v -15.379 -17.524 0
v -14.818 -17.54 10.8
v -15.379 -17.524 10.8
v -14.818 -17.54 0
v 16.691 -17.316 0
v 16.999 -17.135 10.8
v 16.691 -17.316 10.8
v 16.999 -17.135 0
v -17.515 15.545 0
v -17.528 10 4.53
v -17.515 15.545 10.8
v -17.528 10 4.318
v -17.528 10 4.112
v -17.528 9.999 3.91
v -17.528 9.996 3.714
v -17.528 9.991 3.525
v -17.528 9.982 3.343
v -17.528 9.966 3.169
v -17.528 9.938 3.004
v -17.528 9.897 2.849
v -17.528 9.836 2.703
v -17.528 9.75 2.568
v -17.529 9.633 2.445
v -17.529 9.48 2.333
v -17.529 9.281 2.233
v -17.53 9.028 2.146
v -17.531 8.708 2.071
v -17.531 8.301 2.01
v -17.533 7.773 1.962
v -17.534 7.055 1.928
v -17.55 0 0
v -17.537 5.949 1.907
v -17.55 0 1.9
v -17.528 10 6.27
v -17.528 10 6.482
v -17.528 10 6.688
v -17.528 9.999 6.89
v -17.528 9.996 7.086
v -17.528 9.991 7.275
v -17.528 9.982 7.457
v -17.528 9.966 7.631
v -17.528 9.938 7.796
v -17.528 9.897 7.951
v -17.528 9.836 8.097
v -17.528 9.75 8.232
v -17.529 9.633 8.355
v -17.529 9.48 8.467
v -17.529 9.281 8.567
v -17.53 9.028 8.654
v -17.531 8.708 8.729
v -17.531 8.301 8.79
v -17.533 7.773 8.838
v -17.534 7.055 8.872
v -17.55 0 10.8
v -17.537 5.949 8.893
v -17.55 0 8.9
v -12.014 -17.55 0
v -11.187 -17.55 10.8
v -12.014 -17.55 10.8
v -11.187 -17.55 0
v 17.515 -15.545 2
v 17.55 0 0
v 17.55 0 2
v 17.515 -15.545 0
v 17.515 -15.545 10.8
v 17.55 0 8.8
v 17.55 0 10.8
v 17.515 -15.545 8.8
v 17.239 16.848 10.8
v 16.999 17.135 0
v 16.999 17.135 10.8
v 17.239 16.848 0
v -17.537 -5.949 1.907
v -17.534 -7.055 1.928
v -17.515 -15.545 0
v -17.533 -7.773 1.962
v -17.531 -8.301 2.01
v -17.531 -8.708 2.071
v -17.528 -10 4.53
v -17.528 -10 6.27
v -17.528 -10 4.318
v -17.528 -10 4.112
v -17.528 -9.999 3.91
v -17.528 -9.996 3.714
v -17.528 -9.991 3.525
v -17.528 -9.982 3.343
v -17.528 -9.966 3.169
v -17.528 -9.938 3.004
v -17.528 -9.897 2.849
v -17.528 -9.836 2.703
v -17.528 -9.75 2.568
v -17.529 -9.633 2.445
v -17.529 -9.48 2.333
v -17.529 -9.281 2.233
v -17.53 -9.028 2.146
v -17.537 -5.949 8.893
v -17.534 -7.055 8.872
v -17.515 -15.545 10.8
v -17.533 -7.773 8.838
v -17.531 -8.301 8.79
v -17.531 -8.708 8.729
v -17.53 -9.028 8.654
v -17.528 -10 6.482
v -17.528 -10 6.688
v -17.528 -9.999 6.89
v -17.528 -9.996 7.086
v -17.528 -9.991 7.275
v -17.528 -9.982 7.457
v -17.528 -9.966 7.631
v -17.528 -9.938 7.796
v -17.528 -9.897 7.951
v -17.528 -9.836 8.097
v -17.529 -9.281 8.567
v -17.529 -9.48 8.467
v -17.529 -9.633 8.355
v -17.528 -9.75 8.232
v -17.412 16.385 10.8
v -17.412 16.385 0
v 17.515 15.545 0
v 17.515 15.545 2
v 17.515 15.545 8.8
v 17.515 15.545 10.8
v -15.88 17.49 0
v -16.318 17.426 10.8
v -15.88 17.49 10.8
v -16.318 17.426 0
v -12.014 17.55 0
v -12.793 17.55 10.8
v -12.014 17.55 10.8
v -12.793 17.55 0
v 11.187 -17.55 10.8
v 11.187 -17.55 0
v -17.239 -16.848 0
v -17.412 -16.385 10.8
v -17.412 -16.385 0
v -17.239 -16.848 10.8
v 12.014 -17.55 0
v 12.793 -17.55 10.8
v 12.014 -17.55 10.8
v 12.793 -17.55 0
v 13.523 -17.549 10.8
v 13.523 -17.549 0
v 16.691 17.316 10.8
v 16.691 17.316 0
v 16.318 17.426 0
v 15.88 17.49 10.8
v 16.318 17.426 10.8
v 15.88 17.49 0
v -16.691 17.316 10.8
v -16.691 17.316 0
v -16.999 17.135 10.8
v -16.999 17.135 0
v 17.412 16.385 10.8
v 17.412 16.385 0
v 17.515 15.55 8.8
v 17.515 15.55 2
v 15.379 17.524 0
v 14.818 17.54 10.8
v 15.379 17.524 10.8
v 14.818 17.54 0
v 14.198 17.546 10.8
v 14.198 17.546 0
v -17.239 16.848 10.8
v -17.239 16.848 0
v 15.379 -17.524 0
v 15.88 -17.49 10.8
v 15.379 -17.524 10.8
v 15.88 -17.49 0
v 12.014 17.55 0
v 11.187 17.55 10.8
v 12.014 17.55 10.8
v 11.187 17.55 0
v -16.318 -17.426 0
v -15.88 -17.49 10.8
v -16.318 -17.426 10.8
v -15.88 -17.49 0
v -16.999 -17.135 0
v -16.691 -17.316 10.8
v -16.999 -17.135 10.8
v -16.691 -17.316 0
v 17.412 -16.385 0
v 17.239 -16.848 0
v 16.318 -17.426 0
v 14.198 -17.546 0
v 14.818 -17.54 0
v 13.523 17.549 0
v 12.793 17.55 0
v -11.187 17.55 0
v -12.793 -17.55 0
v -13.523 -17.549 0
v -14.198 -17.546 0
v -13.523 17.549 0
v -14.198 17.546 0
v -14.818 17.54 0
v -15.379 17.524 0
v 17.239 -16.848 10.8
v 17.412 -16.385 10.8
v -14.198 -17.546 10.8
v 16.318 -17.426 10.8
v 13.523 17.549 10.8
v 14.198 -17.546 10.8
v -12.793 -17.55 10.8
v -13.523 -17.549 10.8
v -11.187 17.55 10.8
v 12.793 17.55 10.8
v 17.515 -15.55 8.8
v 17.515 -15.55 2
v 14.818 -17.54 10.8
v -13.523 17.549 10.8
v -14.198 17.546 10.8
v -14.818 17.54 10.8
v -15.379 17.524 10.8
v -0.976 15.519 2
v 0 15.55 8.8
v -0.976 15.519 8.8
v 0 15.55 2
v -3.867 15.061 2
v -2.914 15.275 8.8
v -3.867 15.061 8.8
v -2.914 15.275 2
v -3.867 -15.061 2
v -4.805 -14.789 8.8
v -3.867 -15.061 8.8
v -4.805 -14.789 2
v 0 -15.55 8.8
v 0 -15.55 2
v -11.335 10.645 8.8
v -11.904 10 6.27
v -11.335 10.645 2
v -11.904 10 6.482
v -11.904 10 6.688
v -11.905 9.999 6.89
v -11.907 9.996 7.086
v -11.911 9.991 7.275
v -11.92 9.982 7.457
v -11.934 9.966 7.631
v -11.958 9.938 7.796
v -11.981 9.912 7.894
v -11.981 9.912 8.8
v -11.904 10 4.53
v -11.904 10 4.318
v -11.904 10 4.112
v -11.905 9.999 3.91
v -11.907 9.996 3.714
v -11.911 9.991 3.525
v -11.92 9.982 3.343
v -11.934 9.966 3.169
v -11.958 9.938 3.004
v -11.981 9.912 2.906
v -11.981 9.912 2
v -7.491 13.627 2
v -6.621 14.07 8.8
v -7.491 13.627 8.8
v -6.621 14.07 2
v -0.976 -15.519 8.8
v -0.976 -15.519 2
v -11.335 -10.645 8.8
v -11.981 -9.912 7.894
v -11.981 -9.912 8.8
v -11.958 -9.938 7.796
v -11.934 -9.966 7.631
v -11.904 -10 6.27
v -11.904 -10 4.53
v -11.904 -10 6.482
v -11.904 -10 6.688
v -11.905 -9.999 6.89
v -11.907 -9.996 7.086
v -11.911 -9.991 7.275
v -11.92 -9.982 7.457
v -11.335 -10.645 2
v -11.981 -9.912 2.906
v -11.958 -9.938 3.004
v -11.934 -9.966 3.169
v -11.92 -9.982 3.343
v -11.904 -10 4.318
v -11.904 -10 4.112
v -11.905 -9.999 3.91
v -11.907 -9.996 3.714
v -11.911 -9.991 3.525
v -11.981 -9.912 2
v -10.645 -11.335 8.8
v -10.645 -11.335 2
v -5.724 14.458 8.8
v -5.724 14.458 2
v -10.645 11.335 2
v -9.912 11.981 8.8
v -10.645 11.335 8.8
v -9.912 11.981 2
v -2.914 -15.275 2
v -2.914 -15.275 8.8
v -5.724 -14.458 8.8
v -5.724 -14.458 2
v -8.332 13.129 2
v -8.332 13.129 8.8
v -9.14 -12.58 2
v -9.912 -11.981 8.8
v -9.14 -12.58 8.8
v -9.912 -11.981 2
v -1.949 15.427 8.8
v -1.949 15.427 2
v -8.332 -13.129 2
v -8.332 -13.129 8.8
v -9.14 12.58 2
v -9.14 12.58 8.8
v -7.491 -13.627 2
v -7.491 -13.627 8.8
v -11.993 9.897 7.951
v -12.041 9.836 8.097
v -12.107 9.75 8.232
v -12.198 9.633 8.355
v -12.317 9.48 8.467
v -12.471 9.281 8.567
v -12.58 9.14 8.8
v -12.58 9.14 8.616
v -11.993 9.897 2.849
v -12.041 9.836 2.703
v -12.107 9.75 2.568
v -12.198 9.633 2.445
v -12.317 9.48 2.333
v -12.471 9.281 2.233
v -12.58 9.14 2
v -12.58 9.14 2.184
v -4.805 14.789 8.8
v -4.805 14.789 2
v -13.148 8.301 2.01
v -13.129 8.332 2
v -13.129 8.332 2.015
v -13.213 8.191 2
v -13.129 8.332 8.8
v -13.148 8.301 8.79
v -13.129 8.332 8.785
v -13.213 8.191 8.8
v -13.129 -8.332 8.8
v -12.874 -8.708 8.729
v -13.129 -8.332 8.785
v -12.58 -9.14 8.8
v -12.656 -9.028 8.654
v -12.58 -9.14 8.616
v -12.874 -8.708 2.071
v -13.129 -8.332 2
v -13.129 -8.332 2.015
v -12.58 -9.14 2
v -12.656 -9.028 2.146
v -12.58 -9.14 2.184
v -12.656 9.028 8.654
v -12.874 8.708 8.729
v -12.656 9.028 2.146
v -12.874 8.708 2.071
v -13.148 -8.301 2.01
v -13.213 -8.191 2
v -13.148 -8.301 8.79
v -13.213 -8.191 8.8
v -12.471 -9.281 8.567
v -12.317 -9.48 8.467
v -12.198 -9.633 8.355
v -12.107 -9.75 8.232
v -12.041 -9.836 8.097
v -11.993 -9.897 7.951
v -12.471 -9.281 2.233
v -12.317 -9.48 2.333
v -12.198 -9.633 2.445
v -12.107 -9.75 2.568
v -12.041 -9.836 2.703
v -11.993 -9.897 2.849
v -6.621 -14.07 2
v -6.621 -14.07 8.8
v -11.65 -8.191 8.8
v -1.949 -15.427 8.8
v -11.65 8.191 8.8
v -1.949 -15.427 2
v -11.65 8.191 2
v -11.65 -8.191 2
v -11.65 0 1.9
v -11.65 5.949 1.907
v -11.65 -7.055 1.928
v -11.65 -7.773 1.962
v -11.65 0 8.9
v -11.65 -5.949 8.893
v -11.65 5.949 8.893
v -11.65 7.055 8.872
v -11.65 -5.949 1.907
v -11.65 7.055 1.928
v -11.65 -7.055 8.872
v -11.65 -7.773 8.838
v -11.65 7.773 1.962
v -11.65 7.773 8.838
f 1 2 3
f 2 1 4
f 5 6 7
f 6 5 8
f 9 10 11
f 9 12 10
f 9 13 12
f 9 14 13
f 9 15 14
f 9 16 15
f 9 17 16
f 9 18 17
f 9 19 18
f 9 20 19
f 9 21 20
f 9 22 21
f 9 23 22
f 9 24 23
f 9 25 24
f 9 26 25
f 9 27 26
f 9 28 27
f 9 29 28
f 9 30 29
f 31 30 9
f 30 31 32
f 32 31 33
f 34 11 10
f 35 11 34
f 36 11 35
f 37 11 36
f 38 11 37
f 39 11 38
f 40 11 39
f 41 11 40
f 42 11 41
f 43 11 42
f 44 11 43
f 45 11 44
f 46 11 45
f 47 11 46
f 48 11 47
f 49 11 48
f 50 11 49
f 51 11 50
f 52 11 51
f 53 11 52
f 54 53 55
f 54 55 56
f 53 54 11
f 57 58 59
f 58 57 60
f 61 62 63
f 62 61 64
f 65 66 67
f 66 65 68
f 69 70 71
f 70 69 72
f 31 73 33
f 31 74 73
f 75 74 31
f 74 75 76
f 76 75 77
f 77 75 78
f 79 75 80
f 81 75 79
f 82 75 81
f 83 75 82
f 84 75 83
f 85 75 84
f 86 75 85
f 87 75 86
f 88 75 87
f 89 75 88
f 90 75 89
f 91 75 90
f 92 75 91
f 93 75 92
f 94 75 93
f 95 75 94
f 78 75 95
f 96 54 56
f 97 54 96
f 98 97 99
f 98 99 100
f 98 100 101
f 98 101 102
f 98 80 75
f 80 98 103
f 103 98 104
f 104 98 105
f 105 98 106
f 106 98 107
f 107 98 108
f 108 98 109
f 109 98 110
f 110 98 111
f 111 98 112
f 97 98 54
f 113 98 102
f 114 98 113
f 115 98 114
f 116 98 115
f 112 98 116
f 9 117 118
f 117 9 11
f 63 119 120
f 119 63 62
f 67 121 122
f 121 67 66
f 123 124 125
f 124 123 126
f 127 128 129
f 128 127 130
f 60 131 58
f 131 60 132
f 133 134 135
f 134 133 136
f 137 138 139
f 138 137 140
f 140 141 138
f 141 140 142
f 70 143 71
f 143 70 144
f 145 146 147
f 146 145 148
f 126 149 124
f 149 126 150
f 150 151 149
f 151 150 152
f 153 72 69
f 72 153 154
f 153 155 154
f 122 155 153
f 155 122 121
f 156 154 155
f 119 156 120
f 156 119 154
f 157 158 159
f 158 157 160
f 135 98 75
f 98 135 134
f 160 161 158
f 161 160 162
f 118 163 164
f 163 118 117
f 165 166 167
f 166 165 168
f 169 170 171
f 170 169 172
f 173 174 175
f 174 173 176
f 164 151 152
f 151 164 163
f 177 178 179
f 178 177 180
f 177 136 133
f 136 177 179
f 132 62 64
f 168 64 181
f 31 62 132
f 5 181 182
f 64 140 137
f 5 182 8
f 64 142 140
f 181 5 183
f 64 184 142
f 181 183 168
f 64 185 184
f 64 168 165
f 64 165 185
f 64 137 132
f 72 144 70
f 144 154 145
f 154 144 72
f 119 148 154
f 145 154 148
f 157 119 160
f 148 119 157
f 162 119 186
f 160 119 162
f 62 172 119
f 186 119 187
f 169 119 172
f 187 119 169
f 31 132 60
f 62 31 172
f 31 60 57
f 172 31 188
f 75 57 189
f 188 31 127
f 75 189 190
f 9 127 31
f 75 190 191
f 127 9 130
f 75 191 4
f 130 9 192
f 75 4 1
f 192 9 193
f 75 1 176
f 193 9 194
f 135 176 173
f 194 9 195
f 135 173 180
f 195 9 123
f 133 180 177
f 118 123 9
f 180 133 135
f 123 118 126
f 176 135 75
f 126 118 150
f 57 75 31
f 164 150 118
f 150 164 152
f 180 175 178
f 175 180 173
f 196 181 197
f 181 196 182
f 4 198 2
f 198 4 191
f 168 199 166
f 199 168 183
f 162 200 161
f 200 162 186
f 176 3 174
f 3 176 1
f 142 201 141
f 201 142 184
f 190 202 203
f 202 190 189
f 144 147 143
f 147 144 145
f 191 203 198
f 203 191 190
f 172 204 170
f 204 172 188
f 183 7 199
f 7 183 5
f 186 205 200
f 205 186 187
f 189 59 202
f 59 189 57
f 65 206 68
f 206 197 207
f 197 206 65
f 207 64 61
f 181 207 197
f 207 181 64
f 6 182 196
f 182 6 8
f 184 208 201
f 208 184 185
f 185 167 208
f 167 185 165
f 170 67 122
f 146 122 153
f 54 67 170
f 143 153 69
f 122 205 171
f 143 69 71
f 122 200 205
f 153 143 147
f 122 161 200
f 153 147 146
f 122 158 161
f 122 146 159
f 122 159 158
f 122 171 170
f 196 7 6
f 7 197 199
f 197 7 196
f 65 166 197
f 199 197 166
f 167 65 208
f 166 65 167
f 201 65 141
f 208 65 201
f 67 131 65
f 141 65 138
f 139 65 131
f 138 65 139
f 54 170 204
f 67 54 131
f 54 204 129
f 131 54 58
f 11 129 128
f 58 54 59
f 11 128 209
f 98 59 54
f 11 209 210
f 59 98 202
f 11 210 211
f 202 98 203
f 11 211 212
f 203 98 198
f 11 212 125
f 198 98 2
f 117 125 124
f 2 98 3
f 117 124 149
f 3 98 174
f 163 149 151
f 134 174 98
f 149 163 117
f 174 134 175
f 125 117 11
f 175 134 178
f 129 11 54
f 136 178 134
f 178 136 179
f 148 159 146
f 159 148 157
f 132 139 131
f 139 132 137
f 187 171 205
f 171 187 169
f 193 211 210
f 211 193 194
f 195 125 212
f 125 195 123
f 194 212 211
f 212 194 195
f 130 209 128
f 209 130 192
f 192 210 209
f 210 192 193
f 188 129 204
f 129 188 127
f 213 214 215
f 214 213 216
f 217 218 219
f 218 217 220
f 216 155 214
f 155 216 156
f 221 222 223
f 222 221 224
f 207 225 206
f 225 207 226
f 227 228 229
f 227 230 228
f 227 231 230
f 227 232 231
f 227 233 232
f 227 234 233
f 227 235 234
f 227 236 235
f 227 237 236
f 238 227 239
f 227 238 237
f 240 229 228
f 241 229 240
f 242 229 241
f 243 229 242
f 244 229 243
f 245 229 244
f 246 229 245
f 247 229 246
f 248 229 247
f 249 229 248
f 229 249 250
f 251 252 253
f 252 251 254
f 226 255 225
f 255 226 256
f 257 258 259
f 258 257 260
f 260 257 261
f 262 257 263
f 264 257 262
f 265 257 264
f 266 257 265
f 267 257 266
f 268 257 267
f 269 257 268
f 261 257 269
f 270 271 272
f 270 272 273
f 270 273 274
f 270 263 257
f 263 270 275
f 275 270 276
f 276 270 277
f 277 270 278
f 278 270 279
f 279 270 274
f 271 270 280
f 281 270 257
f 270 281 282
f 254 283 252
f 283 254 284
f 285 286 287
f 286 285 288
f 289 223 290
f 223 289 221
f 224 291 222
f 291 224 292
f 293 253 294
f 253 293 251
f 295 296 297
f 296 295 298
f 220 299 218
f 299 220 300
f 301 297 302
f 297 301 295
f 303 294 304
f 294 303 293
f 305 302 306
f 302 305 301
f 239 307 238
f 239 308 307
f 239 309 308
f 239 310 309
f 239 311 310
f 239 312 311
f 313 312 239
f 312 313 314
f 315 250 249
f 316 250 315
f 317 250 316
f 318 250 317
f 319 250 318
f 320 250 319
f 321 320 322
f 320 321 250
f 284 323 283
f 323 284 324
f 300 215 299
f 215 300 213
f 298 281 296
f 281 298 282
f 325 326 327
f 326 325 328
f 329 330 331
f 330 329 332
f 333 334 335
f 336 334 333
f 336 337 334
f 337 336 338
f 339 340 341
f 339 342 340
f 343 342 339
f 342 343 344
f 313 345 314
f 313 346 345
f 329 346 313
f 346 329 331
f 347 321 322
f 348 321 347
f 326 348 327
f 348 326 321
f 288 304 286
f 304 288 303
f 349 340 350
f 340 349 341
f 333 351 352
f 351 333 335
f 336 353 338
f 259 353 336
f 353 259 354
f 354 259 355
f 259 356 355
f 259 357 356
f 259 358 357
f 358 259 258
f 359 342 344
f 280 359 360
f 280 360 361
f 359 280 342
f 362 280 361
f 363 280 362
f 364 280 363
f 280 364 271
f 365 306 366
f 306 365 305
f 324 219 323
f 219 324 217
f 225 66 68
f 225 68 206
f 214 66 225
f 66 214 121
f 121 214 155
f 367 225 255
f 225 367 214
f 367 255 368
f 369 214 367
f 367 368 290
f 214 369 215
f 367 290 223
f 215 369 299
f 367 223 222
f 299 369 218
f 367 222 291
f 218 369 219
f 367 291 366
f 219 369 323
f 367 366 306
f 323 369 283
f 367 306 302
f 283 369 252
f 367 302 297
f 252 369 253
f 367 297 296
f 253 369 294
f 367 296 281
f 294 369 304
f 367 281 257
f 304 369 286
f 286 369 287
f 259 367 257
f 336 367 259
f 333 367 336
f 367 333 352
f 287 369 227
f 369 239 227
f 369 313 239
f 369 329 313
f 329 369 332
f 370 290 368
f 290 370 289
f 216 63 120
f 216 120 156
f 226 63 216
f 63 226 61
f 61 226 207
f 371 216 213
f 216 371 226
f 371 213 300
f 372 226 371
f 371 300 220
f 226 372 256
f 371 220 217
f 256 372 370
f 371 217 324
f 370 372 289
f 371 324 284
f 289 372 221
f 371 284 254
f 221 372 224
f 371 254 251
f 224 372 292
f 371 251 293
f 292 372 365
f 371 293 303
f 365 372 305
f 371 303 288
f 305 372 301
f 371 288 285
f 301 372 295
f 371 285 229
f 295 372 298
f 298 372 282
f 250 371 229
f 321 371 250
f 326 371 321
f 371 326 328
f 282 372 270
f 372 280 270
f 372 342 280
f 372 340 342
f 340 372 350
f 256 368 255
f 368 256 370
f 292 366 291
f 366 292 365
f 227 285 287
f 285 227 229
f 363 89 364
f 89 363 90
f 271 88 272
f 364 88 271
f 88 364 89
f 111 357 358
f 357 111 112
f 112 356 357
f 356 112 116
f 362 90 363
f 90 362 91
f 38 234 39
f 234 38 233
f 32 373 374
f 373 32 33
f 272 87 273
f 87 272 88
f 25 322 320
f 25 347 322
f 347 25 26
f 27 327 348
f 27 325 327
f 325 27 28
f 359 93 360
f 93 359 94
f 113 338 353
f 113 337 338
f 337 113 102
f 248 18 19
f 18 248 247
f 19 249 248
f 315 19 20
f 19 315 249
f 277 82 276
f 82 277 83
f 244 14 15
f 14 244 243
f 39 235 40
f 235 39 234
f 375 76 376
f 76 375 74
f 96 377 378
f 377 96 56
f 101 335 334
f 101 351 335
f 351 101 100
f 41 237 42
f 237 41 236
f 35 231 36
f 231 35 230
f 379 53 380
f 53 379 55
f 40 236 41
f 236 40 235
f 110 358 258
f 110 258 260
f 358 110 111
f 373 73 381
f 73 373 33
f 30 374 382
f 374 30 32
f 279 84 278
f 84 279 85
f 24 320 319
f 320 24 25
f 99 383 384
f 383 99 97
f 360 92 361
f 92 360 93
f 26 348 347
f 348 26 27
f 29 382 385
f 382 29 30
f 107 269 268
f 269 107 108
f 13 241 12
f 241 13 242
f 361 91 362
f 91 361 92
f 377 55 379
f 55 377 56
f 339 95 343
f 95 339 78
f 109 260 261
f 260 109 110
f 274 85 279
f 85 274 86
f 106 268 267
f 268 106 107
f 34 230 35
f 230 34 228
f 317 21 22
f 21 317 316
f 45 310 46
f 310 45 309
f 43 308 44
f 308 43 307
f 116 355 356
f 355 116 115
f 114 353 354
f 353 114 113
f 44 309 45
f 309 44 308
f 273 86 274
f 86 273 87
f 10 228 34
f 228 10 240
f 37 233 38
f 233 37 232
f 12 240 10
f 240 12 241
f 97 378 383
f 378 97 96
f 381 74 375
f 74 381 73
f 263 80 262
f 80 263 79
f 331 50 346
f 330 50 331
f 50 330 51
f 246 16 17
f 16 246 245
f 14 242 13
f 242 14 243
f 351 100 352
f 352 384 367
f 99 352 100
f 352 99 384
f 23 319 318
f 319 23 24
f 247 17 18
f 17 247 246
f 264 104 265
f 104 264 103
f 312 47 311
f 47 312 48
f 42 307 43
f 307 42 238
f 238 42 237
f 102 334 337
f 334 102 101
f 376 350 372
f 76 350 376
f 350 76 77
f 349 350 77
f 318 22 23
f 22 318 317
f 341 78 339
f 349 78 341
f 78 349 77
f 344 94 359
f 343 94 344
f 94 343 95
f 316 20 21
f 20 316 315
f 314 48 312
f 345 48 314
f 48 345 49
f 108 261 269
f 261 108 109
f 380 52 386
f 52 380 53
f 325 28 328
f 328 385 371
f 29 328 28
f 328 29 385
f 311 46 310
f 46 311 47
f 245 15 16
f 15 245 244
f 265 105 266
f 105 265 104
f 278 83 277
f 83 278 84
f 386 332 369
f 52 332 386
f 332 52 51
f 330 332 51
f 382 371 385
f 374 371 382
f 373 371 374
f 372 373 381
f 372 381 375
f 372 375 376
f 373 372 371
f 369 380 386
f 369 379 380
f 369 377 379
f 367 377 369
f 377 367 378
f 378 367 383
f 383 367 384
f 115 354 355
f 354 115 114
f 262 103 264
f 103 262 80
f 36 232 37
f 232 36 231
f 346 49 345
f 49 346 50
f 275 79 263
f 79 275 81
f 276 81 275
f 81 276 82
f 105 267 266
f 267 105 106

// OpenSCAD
// file: ../../functions/reverse.scad
function reverse(lst) =
  let(max = len(lst) - 1) [for(idx = [0 : max]) lst[max - idx]];
// file: ../../modules/superellipse.scad
use <../functions/reverse.scad>

module superellipse(ra = 1, rb = 1, n = 3) {
  inv_n = 1 / n;
  step = 90 / $fn * 4;

  pos_quadrant_pts = [
    for(angle = [0 : step : 90])
      let(x = sin(angle) * ra, y = rb * (1 - (x / ra) ^ n) ^ inv_n) [x, y]
  ];

  rev_pos_quadrant_pts = reverse(pos_quadrant_pts);

  polygon(points = [
    each rev_pos_quadrant_pts,
    for(p = pos_quadrant_pts) [-p.x, p.y],
    for(p = rev_pos_quadrant_pts) [-p.x, -p.y],
    for(p = pos_quadrant_pts) [p.x, -p.y]
  ]);
}
// file: ../../modules/squircle.scad
use <./superellipse.scad>

module squircle(r = 1, n = 3)
  superellipse(ra = r, rb = r, n = n);
// main file
use <../../modules/squircle.scad>
use <../../modules/superellipse.scad>

$fn = 100;

tolerance = 0.1;
filter_diameter = 31 + tolerance;
filter_height = 6.7 + tolerance;

case_height = filter_height + 4;
case_diameter = filter_diameter + 4;

module filter_shape() cylinder(d = filter_diameter, h = filter_height);

difference() {
  linear_extrude(height = case_height) squircle(r = case_diameter / 2, n = 25);

  translate([0, 0, (case_height - filter_height) / 2]) hull() {
    filter_shape();
    translate([case_diameter, 0]) filter_shape();
  }

  translate([-case_diameter / 2 - 0.1, 0, case_height / 2])
    rotate([0, 90]) linear_extrude(height = 6)
    superellipse(ra = filter_height / 2 + 0.1, rb = 10, n = 8);
}
